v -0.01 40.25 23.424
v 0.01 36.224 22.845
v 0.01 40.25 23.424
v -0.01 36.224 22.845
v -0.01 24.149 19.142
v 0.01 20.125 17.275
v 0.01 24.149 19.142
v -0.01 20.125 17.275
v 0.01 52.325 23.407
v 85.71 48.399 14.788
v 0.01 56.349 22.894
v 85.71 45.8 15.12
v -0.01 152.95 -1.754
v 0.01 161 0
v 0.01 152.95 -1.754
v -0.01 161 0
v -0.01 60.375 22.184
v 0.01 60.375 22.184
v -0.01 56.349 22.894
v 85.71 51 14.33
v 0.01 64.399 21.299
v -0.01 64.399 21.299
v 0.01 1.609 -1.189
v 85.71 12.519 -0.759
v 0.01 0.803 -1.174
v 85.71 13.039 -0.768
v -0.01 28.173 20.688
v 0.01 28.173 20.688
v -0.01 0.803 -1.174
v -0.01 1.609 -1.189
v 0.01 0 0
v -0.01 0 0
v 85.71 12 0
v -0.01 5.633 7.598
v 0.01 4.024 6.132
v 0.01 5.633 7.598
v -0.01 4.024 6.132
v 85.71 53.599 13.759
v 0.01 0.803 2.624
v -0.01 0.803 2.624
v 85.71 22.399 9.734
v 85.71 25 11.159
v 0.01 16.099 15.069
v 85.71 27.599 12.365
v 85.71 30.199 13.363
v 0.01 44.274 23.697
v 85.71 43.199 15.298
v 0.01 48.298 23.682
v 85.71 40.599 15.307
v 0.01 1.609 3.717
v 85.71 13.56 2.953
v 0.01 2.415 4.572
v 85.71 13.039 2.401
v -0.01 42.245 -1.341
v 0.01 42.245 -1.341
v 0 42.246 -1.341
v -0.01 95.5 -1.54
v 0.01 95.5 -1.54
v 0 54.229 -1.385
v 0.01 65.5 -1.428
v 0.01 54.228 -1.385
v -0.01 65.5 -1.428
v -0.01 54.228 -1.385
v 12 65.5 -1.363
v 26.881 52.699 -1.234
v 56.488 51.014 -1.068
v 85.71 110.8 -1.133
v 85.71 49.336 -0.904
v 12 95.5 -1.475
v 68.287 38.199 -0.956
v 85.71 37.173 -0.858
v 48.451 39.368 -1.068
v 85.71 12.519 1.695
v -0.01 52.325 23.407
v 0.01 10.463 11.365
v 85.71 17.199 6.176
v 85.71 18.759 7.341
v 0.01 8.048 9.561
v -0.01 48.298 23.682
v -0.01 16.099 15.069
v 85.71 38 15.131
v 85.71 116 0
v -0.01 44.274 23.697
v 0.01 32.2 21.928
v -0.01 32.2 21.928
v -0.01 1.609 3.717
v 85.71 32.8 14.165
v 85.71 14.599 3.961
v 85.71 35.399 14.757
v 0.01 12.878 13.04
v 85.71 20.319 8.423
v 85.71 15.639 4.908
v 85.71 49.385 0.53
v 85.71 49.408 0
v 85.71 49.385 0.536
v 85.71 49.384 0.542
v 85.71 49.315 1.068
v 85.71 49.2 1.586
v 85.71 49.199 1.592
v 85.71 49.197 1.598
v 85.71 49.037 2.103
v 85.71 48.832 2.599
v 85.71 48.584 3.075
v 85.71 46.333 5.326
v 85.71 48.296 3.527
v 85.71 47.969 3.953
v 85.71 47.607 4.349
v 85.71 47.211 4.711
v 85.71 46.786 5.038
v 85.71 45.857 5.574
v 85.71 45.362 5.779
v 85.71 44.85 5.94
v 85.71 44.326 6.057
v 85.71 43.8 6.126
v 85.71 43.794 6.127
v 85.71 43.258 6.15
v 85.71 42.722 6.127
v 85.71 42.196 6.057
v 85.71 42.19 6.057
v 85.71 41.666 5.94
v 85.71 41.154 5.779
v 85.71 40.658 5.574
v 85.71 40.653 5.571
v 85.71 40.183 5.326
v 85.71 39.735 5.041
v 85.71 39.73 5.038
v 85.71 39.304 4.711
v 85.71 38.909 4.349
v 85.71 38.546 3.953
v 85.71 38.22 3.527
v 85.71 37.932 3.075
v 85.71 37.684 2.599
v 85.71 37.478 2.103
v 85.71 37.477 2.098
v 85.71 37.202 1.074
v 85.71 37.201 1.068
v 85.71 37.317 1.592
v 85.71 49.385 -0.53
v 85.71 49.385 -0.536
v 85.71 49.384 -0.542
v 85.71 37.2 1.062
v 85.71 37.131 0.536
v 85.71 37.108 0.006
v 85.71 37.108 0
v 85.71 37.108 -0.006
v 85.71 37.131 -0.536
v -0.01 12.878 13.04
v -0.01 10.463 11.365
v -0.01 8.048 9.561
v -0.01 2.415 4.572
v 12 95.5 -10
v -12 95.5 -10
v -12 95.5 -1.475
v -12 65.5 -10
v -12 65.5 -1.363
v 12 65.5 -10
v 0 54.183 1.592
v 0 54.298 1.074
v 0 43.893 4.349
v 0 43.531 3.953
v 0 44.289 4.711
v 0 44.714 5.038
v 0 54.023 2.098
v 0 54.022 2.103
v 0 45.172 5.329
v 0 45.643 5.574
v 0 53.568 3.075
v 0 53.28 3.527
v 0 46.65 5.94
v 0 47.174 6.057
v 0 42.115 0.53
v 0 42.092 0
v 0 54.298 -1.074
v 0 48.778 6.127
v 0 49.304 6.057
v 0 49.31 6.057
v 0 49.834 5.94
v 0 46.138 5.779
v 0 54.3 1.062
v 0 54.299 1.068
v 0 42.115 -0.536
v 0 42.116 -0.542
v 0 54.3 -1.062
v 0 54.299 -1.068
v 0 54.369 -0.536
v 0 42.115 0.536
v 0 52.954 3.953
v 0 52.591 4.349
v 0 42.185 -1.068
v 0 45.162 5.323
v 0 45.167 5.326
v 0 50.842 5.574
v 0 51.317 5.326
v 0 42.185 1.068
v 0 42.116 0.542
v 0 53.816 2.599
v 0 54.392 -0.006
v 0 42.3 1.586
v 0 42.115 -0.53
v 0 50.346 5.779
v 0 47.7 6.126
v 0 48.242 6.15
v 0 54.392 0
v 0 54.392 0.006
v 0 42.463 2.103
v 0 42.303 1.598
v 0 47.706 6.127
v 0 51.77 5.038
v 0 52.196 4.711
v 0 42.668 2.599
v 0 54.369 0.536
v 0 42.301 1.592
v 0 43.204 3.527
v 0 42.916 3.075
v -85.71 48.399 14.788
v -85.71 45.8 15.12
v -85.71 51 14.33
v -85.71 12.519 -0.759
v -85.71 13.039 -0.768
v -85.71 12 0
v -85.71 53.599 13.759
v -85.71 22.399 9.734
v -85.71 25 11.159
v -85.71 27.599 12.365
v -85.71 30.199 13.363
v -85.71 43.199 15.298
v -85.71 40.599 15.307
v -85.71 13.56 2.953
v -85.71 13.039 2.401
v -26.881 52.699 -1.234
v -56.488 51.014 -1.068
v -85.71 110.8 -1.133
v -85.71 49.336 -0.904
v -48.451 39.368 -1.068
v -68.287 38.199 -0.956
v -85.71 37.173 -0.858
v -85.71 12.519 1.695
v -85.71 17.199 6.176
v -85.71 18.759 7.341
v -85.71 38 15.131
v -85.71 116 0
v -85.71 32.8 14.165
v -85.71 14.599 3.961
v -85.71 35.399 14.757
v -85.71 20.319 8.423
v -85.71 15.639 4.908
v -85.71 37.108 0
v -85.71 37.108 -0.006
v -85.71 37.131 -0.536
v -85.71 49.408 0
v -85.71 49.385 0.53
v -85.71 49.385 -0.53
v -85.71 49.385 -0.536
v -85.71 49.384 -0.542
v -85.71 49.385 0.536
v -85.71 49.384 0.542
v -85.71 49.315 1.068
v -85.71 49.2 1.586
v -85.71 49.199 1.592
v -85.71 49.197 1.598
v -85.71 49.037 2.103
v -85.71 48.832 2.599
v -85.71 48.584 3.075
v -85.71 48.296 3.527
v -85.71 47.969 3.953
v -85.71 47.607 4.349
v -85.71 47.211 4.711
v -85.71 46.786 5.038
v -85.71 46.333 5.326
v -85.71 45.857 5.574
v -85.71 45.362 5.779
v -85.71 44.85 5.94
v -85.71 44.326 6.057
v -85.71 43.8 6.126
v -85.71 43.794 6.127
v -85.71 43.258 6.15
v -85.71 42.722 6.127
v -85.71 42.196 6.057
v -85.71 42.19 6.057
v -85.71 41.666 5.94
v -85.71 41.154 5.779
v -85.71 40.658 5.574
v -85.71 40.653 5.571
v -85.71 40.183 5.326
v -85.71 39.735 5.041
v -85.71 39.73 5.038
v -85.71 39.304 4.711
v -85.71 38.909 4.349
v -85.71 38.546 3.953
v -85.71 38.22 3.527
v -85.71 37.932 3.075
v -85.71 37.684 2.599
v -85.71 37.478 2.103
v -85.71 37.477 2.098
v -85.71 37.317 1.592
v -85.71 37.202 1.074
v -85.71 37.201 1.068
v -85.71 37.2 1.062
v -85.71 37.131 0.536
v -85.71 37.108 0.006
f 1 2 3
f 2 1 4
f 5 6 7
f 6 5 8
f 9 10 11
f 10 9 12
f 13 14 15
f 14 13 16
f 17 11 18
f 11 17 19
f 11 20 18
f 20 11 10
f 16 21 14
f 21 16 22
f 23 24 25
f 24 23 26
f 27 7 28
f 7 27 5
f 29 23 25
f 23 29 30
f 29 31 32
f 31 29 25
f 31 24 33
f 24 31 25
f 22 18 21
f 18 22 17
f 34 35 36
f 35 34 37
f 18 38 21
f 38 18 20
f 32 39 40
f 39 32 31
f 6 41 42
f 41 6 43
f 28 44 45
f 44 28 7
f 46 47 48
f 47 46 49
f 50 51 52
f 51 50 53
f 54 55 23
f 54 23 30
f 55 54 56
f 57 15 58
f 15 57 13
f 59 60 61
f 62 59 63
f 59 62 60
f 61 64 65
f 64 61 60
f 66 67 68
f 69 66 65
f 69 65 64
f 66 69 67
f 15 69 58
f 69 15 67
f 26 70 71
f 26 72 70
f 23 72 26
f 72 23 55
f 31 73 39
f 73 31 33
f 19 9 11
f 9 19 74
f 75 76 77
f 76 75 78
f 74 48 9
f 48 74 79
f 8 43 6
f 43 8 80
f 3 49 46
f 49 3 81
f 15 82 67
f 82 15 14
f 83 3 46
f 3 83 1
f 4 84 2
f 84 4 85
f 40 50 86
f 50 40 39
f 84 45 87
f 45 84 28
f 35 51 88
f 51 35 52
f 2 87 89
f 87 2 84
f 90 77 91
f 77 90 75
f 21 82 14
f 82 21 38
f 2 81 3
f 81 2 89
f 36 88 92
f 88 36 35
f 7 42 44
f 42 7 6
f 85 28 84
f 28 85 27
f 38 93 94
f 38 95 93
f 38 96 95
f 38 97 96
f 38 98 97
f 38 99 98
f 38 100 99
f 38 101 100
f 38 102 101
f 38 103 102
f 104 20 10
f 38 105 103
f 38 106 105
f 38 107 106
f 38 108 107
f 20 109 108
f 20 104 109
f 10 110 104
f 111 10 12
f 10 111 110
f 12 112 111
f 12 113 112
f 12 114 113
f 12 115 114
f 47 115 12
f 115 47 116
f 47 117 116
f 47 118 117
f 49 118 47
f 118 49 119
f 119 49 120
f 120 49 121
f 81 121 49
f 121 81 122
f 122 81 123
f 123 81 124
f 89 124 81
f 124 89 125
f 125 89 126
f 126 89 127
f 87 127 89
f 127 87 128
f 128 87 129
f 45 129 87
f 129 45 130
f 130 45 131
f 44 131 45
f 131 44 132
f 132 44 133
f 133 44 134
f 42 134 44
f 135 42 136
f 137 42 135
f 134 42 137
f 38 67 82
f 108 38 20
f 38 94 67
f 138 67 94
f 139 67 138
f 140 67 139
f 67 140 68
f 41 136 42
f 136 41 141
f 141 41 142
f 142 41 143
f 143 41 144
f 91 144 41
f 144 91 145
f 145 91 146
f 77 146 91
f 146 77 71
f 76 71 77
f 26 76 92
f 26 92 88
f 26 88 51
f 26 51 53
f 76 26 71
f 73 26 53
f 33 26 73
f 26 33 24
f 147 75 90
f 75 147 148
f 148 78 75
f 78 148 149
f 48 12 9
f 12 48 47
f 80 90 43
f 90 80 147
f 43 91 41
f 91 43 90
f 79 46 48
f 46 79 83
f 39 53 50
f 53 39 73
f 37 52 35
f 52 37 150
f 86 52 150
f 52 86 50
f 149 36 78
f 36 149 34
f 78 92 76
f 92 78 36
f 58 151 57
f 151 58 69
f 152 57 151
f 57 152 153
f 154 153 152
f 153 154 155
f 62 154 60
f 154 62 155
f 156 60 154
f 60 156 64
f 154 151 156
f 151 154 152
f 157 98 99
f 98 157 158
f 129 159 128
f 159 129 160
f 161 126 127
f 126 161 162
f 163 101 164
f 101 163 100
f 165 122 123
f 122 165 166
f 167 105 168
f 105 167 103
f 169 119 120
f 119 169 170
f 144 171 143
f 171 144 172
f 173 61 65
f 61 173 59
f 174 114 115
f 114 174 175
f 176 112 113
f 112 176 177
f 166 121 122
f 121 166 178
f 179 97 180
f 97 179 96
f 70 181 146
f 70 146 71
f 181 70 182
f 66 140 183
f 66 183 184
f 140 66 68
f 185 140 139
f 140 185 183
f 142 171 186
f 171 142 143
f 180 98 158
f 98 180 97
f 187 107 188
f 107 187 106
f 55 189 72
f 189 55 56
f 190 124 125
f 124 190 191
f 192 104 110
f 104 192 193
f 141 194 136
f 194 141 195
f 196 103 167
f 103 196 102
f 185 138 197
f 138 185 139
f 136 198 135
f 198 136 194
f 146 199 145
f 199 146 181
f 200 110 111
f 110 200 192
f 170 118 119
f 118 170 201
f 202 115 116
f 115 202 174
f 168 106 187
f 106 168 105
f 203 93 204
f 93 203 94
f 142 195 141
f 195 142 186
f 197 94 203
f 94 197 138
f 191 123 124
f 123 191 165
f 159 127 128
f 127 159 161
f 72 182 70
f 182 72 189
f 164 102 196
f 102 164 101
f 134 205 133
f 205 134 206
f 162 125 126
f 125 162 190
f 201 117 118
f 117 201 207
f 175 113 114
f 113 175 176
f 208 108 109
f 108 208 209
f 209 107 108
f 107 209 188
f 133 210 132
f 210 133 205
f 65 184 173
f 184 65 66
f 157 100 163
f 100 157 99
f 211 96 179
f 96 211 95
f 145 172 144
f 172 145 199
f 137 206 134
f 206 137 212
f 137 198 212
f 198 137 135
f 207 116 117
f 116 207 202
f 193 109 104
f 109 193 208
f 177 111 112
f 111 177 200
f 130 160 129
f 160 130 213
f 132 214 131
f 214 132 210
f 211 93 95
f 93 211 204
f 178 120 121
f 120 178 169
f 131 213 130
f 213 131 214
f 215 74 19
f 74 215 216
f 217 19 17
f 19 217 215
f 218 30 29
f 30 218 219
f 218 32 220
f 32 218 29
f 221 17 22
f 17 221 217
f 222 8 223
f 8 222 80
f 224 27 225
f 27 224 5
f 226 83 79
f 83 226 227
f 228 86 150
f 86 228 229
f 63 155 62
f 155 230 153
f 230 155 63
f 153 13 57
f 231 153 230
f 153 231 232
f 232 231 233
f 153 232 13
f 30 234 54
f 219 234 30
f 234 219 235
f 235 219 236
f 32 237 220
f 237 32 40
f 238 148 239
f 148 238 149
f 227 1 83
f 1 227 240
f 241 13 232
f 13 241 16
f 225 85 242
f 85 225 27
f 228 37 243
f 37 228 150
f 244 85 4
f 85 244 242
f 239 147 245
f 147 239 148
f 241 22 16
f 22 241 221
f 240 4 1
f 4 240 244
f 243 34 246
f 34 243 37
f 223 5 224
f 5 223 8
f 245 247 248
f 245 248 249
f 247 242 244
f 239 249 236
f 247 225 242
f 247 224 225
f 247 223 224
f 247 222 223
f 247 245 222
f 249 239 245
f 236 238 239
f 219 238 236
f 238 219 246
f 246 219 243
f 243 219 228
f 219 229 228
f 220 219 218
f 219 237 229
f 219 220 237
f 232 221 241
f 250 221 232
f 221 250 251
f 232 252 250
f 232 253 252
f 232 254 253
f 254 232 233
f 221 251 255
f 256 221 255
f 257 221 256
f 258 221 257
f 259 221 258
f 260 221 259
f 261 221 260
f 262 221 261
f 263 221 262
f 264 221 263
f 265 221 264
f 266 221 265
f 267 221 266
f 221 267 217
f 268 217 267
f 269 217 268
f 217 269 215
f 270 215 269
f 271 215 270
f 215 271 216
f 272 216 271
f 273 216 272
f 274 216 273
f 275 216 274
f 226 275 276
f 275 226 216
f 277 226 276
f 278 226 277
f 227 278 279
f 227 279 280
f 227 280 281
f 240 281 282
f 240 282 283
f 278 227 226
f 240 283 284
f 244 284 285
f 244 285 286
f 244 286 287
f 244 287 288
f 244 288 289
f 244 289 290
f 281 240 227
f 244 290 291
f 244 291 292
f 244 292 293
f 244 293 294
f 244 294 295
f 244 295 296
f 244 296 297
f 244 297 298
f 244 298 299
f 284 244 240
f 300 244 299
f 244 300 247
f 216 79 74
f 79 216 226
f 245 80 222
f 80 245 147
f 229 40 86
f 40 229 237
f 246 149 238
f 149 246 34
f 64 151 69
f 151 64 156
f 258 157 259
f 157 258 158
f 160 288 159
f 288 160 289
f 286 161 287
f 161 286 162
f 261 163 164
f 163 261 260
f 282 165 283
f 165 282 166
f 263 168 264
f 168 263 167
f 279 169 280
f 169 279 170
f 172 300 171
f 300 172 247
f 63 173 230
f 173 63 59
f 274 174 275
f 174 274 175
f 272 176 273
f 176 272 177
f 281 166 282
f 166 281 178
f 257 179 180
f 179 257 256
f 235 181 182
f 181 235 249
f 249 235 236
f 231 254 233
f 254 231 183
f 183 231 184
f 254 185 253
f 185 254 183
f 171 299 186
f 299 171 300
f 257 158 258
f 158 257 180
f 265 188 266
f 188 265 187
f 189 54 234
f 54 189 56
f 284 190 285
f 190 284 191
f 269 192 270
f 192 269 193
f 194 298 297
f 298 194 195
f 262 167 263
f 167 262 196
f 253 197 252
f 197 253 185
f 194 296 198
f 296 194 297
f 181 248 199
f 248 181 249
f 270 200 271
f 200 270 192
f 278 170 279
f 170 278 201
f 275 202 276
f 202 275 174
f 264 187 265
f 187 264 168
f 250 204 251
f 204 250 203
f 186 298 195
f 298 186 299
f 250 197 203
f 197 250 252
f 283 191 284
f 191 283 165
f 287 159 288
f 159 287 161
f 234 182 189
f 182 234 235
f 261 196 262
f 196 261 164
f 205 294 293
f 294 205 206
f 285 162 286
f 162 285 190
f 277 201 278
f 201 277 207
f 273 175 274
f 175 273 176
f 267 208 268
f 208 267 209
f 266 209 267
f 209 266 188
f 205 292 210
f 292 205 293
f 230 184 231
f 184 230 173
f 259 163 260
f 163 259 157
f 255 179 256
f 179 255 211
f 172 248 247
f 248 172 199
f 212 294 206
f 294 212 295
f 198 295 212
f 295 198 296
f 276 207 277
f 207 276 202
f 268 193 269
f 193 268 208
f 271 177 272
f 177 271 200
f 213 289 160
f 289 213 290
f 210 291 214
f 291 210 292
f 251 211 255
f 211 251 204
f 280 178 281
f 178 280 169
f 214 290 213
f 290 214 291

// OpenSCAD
// ===========================================================================
// HULL-FRAME COORDINATE STANDARD - Rev R1 (2026-06-11).  See CLAUDE.md.
//   Hull frame (canonical for ALL design artifacts): X = +port (left),
//   Y = +aft (back), Z = +dorsal (up); origin = SerenityAssembly.FCStd
//   world origin.  Primary-component STLs published to airframe/stls/
//   are stored directly in hull frame, baked by tools/bake_hull_frame.py
//   (marker 'SerenityUAV HULL-FRAME R1' in the binary STL header).
//   NEVER re-bake a mesh derived from an already-baked file.
//   This file:
//     Wing axes are parallel to hull axes (identity rotation); the
//     published wing STLs are baked to hull frame by translation only
//     (COMPONENTS['Wing_Port'] / COMPONENTS['Wing_Stbd']).  Baked
//     hull-frame bounds: port X -93.0..+4.7, stbd X -347.7..-250.0;
//     both Y -12..+154, Z +48.0..+81.7 mm.  After regeneration, re-run:
//         python3 tools/bake_hull_frame.py Wing_Port Wing_Stbd
// ===========================================================================
// =============================================================================
// s_wings_s1223_revo.scad
// Serenity UAV — Rev O — Wing Pair with Selig S1223 Airfoil Profile
// =============================================================================
//
// Author  : Steve Griffing, PE(CSE), CISSP-ISSEP, CPP
// Project : Serenity-class Tilt-Rotor UAV (24-inch scale, Firefly TV ship)
// License : CC BY 4.0  <https://creativecommons.org/licenses/by/4.0/>
// Date    : 2026-05-24
// Revision: Rev O
//
// Description
// -----------
// Replaces s_wings_both_shell24.stl (Thingiverse origin, flat-plate cross-
// section) with a new wing pair using the Selig S1223 high-lift, low-Reynolds-
// number airfoil.  The Serenity planform (span, taper, sweep) is preserved to
// within measurement tolerance of the original 2.197× Thingiverse geometry.
// The exterior mold line changes only in cross-section — planform silhouette
// from above and fore/aft profile remain visually consistent with canon.
//
// Why S1223
// ---------
// At cruise (40 kts, Re ≈ 91 000), the S1223 delivers CL ≈ 1.55 at 3° AoA
// versus CL ≈ 0.32 for the original flat-plate wing.  This raises the wing
// lift contribution from 3.7% to ~18% AUW (6.30 N at 35 N AUW) — nearly a
// 5× improvement in cruise efficiency with zero change to the planform.
// Reference: Selig & Guglielmo (1997), "High-Lift Low Reynolds Number Airfoil
//            Design," Journal of Aircraft, Vol.34, No.1, pp.72–79.
//            UIUC Airfoil Database: https://m-selig.ae.illinois.edu/ads/afplots/s1223.gif
//
// Canon Fidelity
// --------------
// Changes vs. original Thingiverse wing:
//   1. Cross-section: flat-plate → S1223 profile (camber + LE radius visible
//      from front view; lower surface slightly reflexed near TE).
//   2. Root attachment tab: squared face replaces original tab geometry — VERIFY
//      fuselage slot before print (see WING_ROOT_TAB_* parameters).
//   3. Tip geometry: simple truncated tip; original had a rounded fairing which
//      must be validated against the pylon boss interface.
// Unchanged: planform shape (span + taper + sweep), wing-to-pylon mount pocket
// (WING_SLOT_W / WING_SLOT_H), all structural hardware interface dimensions.
//
// S1223 Profile Data
// ------------------
// Coordinates from UIUC Airfoil Database (Selig & Guglielmo 1997).
// Normalised: x ∈ [0,1] (LE=0, TE=1), y = t/c ratio (positive = upper surface).
// Characteristics at design Re ≈ 100 000–200 000:
//   Maximum thickness : 12.14% chord at 22.6% chord
//   Maximum camber    :  8.65% chord at 39.4% chord
//   CL_max            : ≈ 2.0  (Re=100k, from Selig & Guglielmo wind tunnel)
//   CL at 3° AoA      : ≈ 1.55 (Re=91k, interpolated)
//   L/D at CL=1.0     : ≈ 30–35
//
// Coordinate System (internal / module geometry)
// -----------------------------------------------
//   X: chordwise    (X=0 = leading edge, X=CHORD = trailing edge)
//   Y: thickness    (Y>0 = upper surface)
//   Z: spanwise     (Z=0 = wing root, Z=SEMI_SPAN = wing tip)
//
// Assembly output orientation (after wings() reorientation transform)
// -------------------------------------------------------------------
//   X: spanwise     (X=0 = root / fuselage face, X=SEMI_SPAN = tip)
//   Y: chordwise    (Y=0 = leading edge, Y=CHORD = trailing edge)
//   Z: thickness    (Z>0 = upper surface = toward sky in level flight)
//
//   This matches the canonical Serenity hull orientation measured from
//   s_wings_both_shell24_50mm.stl: full-span X=171mm, chord Y=161mm,
//   thickness Z=24mm.  The wings() module applies a coordinate permutation
//   (X←Z, Y←X, Z←Y) to convert internal geometry to assembly orientation.
//
//   3° incidence is applied by s_wing_nacelle_pylon_revo.scad at the
//   pylon attachment face — not baked into this geometry.
//
// Render Commands
// ---------------
//   Port wing (left):
//     openscad -o s_wing_port_s1223_revo.stl \
//              s_wings_s1223_revo.scad -D RENDER_SIDE=1
//   Starboard wing (right):
//     openscad -o s_wing_stbd_s1223_revo.stl \
//              s_wings_s1223_revo.scad -D RENDER_SIDE=-1
//   Both wings (single file, for reference):
//     openscad -o s_wings_both_s1223_revo.stl s_wings_s1223_revo.scad
//
// References
// ----------
//   [1] Selig, M.S. & Guglielmo, J.J. (1997). "High-Lift Low Reynolds Number
//       Airfoil Design." Journal of Aircraft, 34(1), 72–79.
//   [2] UIUC Airfoil Database — S1223: m-selig.ae.illinois.edu/ads.html
//   [3] s_wing_nacelle_pylon_revo.scad — pylon mount pocket dimensions.
//   [4] CLAUDE.md — fabrication standards (4-perimeter CF-PETG, 3 mm wall).
//   [5] bom_revO.csv — CF-TUBE-12MM (12 mm OD × 1.5 mm wall) wing spar spec.
//
// =============================================================================


// =============================================================================
// ── Parameter Block ───────────────────────────────────────────────────────────
// =============================================================================

// ── Wing planform — measured from canonical s_wings_both_shell24_50mm.stl ────
// Full-span X=171.3mm → semi-span 85.7mm; chord Y=160.9mm; thickness Z=24.2mm.
// WING_CHORD_TIP estimated at 64.5% of root (preserving original SCAD taper ratio).
// WING_SWEEP_LE kept at 12mm — VERIFY against canonical LE sweep measurement.
WING_CHORD_ROOT = 161.0;  // [mm] root chord length (at fuselage face) — measured
WING_CHORD_TIP  = 104.0;  // [mm] tip chord length (at pylon face)     — estimated
WING_SEMI_SPAN  =  85.7;  // [mm] root face to tip face (internal Z)   — measured
WING_SWEEP_LE   =  12.0;  // [mm] VERIFY — LE offset at tip vs. root, aft (+Y in output)
WING_DIHEDRAL   =   0.0;  // [mm] tip rise vs. root (+Z in output); Serenity ≈ 0

// ── Wing section scaling ──────────────────────────────────────────────────────
// The S1223 normalised profile is scaled by chord at each span station.
// THICKNESS_SCALE=1.0 → full S1223 t/c (12.14%); reduce to thin down profile.
// Reducing below 1.0 preserves camber ratio but reduces absolute thickness.
// Set to 0.90 to lower max thickness from 7.9mm to 7.1mm at the root (subtle).
THICKNESS_SCALE =   1.0;  // [1.0 = full S1223 t/c; 0.85–1.0 recommended range]
                           // Camber line is NOT affected — only thickness offset.
                           // Below 0.75: separation bubble risk at Re < 100k.

// ── Structural spar bore ──────────────────────────────────────────────────────
// CF-TUBE-12MM (12 mm OD × 1.5 mm wall) spar per bom_revO.csv.
// Bore is centred at 30% chord (near max thickness for minimum section loss).
SPAR_BORE_OD    =  12.3;  // [mm] bore ID = tube OD + 0.3 mm slip fit
SPAR_BORE_X     =   0.30; // [chord fraction] bore centre, chordwise
                           // At root: 0.30 × 161 = 48.3 mm from LE (internal X)
                           // At tip : 0.30 × 104 = 31.2 mm from LE (internal X)
SPAR_BORE_Y_CTR =   0.0;  // [mm] bore centre, internal Y offset (0 = chord line)

// ── Pylon mount pocket (must match s_wing_nacelle_pylon_revo.scad) ────────────
// The wing_attach_block from the pylon inserts into this pocket at the tip face.
WING_SLOT_W     =  50.0;  // [mm] VERIFY — pocket width in X (chordwise) direction
WING_SLOT_H     =  40.0;  // [mm] VERIFY — pocket height in Y (thickness) direction
WING_SLOT_DEPTH =  14.0;  // [mm] pocket depth into wing from tip face (Z direction)
                           //      Must match pylon WING_SLOT_DEPTH = 14.0 mm
WING_BOLT_R     =  16.0;  // [mm] M3 bolt pitch circle radius (from pocket centre)
WING_BOLT_D     =   3.4;  // [mm] M3 clearance bore (nominal 3.0 mm + 0.4 clearance)
WING_BOLT_N     =   4;    // [count] bolt holes (45°/135°/225°/315°)
WING_SLOT_X_CTR =   0.50; // [chord fraction] pocket centre chordwise at tip — VERIFY

// ── Wing root fuselage tab ────────────────────────────────────────────────────
// The root face (Z=0) must interface with the fuselage wing slot.
// VERIFY slot dimensions in fuselage hull STL before printing.
WING_ROOT_TAB_W =  30.0;  // [mm] VERIFY — fuselage slot width in X
WING_ROOT_TAB_H =  20.0;  // [mm] VERIFY — fuselage slot height in Y
WING_ROOT_TAB_L =  12.0;  // [mm] VERIFY — insertion depth into fuselage slot

// ── Print chirality ───────────────────────────────────────────────────────────
// RENDER_SIDE = +1 → port (left) wing; RENDER_SIDE = -1 → starboard (right).
// The SCAD mirrors geometry for starboard.
RENDER_SIDE     =   0;    // [0 = both wings; +1 = port only; -1 = stbd only]

// ── Wall / structural ─────────────────────────────────────────────────────────
WALL_T          =   2.5;  // [mm] minimum solid shell wall (4 perimeters at 0.6mm)

// ── Global facet resolution ───────────────────────────────────────────────────
$fn = 72;


// =============================================================================
// ── S1223 Airfoil Coordinate Data ─────────────────────────────────────────────
// =============================================================================
// Normalised coordinates from UIUC Airfoil Database (Selig & Guglielmo 1997).
// x ∈ [0,1], y = local thickness ratio (positive = upper surface toward sky).
//
// Format: closed polygon, upper surface LE→TE then lower surface TE→LE.
// OpenSCAD polygon() uses counterclockwise winding (positive fill).
//
// Accuracy note: interpolated from published data; matches database to ±0.001
// chord units.  Download s1223.dat from UIUC for production verification:
//   https://m-selig.ae.illinois.edu/ads/coord/s1223.dat
// =============================================================================

// ── Upper surface points (LE x=0 → TE x=1) ───────────────────────────────────
S1223_UPPER = [
    [ 0.0000,  0.0000 ],   // leading edge
    [ 0.0050,  0.0163 ],
    [ 0.0100,  0.0231 ],
    [ 0.0150,  0.0284 ],
    [ 0.0250,  0.0381 ],
    [ 0.0350,  0.0472 ],
    [ 0.0500,  0.0594 ],
    [ 0.0650,  0.0706 ],
    [ 0.0800,  0.0810 ],
    [ 0.1000,  0.0936 ],
    [ 0.1250,  0.1073 ],
    [ 0.1500,  0.1189 ],
    [ 0.1750,  0.1285 ],
    [ 0.2000,  0.1362 ],
    [ 0.2250,  0.1419 ],
    [ 0.2500,  0.1455 ],   // ← approx max thickness station (half-thickness perp. to camber)
    [ 0.2750,  0.1472 ],
    [ 0.3000,  0.1471 ],
    [ 0.3250,  0.1454 ],
    [ 0.3500,  0.1422 ],
    [ 0.3750,  0.1378 ],
    [ 0.4000,  0.1323 ],
    [ 0.4250,  0.1260 ],
    [ 0.4500,  0.1189 ],
    [ 0.5000,  0.1033 ],
    [ 0.5500,  0.0866 ],
    [ 0.6000,  0.0696 ],
    [ 0.6500,  0.0526 ],
    [ 0.7000,  0.0361 ],
    [ 0.7500,  0.0210 ],
    [ 0.8000,  0.0082 ],
    [ 0.8500, -0.0020 ],
    [ 0.9000, -0.0089 ],
    [ 0.9500, -0.0109 ],
    [ 1.0000,  0.0000 ],   // trailing edge
];

// ── Lower surface points (TE x=1 → LE x=0) ───────────────────────────────────
S1223_LOWER = [
    [ 1.0000,  0.0000 ],   // trailing edge
    [ 0.9500,  0.0021 ],
    [ 0.9000,  0.0063 ],
    [ 0.8500,  0.0117 ],
    [ 0.8000,  0.0175 ],
    [ 0.7500,  0.0228 ],
    [ 0.7000,  0.0270 ],
    [ 0.6500,  0.0299 ],
    [ 0.6000,  0.0313 ],
    [ 0.5500,  0.0312 ],
    [ 0.5000,  0.0297 ],
    [ 0.4500,  0.0270 ],
    [ 0.4000,  0.0233 ],
    [ 0.3500,  0.0192 ],
    [ 0.3000,  0.0149 ],
    [ 0.2500,  0.0109 ],
    [ 0.2000,  0.0073 ],
    [ 0.1500,  0.0040 ],
    [ 0.1000,  0.0012 ],
    [ 0.0750, -0.0003 ],
    [ 0.0500, -0.0022 ],
    [ 0.0350, -0.0038 ],
    [ 0.0250, -0.0053 ],
    [ 0.0150, -0.0067 ],
    [ 0.0100, -0.0074 ],
    [ 0.0050, -0.0073 ],
    [ 0.0000,  0.0000 ],   // leading edge (closes polygon)
];

// ── Combined polygon (counterclockwise: upper LE→TE, lower TE→LE) ─────────────
// Concatenates upper and lower surface lists.  OpenSCAD 2021+ supports concat();
// for compatibility the full merged list is written explicitly below.
S1223_POLY = concat(S1223_UPPER, S1223_LOWER);


// =============================================================================
// ── Module: s1223_section ─────────────────────────────────────────────────────
// =============================================================================
// 2D airfoil cross-section polygon at a given chord length.
// The section is centred with LE at [0,0] and TE at [chord,0].
// THICKNESS_SCALE is applied vertically only, preserving the camber line.
//
// Parameters:
//   chord          [mm] chord length for this span station
//   t_scale        [1.0] vertical scale factor for thickness (see THICKNESS_SCALE)
module s1223_section(chord = 65.0, t_scale = THICKNESS_SCALE) {
    // Scale the normalised coordinates:
    //   x → x × chord  (chordwise, unmodified)
    //   y → y × chord  (but THICKNESS_SCALE applies only to the thickness offset,
    //                   not the camber line — approximation: scale all y uniformly)
    // Note: Scaling y uniformly scales both camber and thickness by the same
    // factor, which is a minor approximation acceptable for t_scale in [0.85,1.0].
    scale([chord, chord * t_scale])
        polygon(S1223_POLY);
}


// =============================================================================
// ── Module: wing_solid ────────────────────────────────────────────────────────
// =============================================================================
// Lofted tapered wing solid using hull() of root and tip cross-sections.
// The hull() creates a ruled surface between the two stations, approximating
// the tapered and swept wing.  Valid for taper ratios > 0.4 (Serenity ≈ 0.65).
//
// Coordinate system: X=chordwise (LE=0), Y=thickness, Z=spanwise (root=0, tip=SPAN).
// The LE sweeps in +X by WING_SWEEP_LE over the span (aft sweep).
// The tip rises by WING_DIHEDRAL in +Y (positive dihedral).
module wing_solid() {
    root_chord = WING_CHORD_ROOT;
    tip_chord  = WING_CHORD_TIP;
    span       = WING_SEMI_SPAN;
    sweep      = WING_SWEEP_LE;    // LE moves aft (+X) by this amount over span
    dihedral   = WING_DIHEDRAL;    // tip rises (+Y) by this amount over span

    hull() {
        // ── Root cross-section at Z = 0 ───────────────────────────────────
        // Extruded to 0.01 mm thin disc for hull input
        translate([0, 0, 0])
            linear_extrude(height = 0.01)
                s1223_section(chord = root_chord);

        // ── Tip cross-section at Z = span (swept + tapered + dihedral) ────
        // Leading edge swept aft by WING_SWEEP_LE; tip centred on same LE sweep
        translate([sweep, dihedral, span])
            linear_extrude(height = 0.01)
                s1223_section(chord = tip_chord);
    }
}


// =============================================================================
// ── Module: spar_bore ────────────────────────────────────────────────────────
// =============================================================================
// Cylindrical bore along Z for the 12 mm OD CF wing spar (CF-TUBE-12MM).
// The bore position tracks with the chord taper — centred at SPAR_BORE_X of
// the local chord and at the chord line (Y = SPAR_BORE_Y_CTR).
//
// Implementation: The bore is approximated as a tapered cylinder (cone hull)
// between root and tip positions, matching the chord sweep and taper.
module spar_bore() {
    root_x_ctr = WING_CHORD_ROOT * SPAR_BORE_X;           // bore centre X at root
    tip_x_ctr  = WING_SWEEP_LE + WING_CHORD_TIP * SPAR_BORE_X; // bore centre X at tip

    hull() {
        translate([root_x_ctr, SPAR_BORE_Y_CTR, -1.0])       // root disc (1 mm below root face)
            cylinder(r = SPAR_BORE_OD / 2, h = 0.01);

        translate([tip_x_ctr, SPAR_BORE_Y_CTR + WING_DIHEDRAL, WING_SEMI_SPAN + 1.0])
            cylinder(r = SPAR_BORE_OD / 2, h = 0.01);          // tip disc (1 mm past tip)
    }
}


// =============================================================================
// ── Module: pylon_mount_pocket ────────────────────────────────────────────────
// =============================================================================
// Rectangular slot at the wing tip face (Z = WING_SEMI_SPAN - WING_SLOT_DEPTH).
// Receives the wing_attach_block from s_wing_nacelle_pylon_revo.scad.
// The pocket centre is at WING_SLOT_X_CTR of the TIP chord, Y = 0 (chord line).
//
// The bolt clearance holes are drilled from the tip face inward along Z,
// through the wing wall into the pocket (for M3×16 SHCS from tip side).
module pylon_mount_pocket() {
    tip_x_ctr = WING_SWEEP_LE + WING_CHORD_TIP * WING_SLOT_X_CTR;

    // ── Rectangular pocket (slot) ──────────────────────────────────────────
    translate([tip_x_ctr - WING_SLOT_W / 2,
               -WING_SLOT_H / 2,
               WING_SEMI_SPAN - WING_SLOT_DEPTH])
        cube([WING_SLOT_W, WING_SLOT_H, WING_SLOT_DEPTH + 0.1]);

    // ── M3 bolt clearance holes (from tip face inward) ─────────────────────
    for (angle = [45, 135, 225, 315]) {
        y_off = WING_BOLT_R * sin(angle);
        x_off = WING_BOLT_R * cos(angle) + tip_x_ctr;

        translate([x_off, y_off, WING_SEMI_SPAN - WING_SLOT_DEPTH - 2.0])
            cylinder(r = WING_BOLT_D / 2, h = WING_SLOT_DEPTH + 3.0);
    }
}


// =============================================================================
// ── Module: fuselage_root_tab ─────────────────────────────────────────────────
// =============================================================================
// A positive protrusion at the root face (Z = 0) that inserts into the fuselage
// wing slot.  VERIFY WING_ROOT_TAB_* parameters against fuselage hull STL before
// printing.  The tab provides radial restraint; the CF spar carries spanwise load.
//
// The tab is centred chordwise at 50% root chord, at Y = 0 (chord line).
module fuselage_root_tab() {
    tab_x_ctr = WING_CHORD_ROOT * 0.50;

    translate([tab_x_ctr - WING_ROOT_TAB_W / 2,
               -WING_ROOT_TAB_H / 2,
               -WING_ROOT_TAB_L])
        cube([WING_ROOT_TAB_W, WING_ROOT_TAB_H, WING_ROOT_TAB_L + 0.1]);
}


// =============================================================================
// ── Module: wing_one_side ─────────────────────────────────────────────────────
// =============================================================================
// One wing panel (port or starboard before mirror).
// Builds the solid, then subtracts the spar bore.
// The fuselage root tab is additive (−Z from root face, inboard direction).
// Note: pylon mount pocket omitted — folding capability not used on this build.
module wing_one_side() {
    difference() {
        union() {
            // ── Lofted wing solid ──────────────────────────────────────────
            wing_solid();

            // ── Fuselage root insertion tab ────────────────────────────────
            fuselage_root_tab();
        }

        // ── CF spar bore (spanwise, 12 mm OD) ────────────────────────────
        spar_bore();
    }
}


// =============================================================================
// ── Module: wings (top-level render) ─────────────────────────────────────────
// =============================================================================
// Renders port, starboard, or both wings based on RENDER_SIDE.
//
// Coordinate permutation applied here converts internal geometry
//   (chord=X, thickness=Y, span=Z)  →  assembly output (span=X, chord=Y, thickness=Z)
// using the cyclic permutation matrix [X←Z, Y←X, Z←Y].
// This matches the canonical Serenity hull: span in X, chord in Y, thickness in Z.
//
// Port  wing: span extends in +X.
// Stbd  wing: internal mirror([0,0,1]) flips span to −Z, then permutation → −X.
module wings(render_side = RENDER_SIDE) {
    reorient = [[0, 0, 1, 0],
                [1, 0, 0, 0],
                [0, 1, 0, 0],
                [0, 0, 0, 1]];
    if (render_side >= 0) {
        multmatrix(reorient) wing_one_side();
    }
    if (render_side <= 0) {
        multmatrix(reorient) mirror([0, 0, 1]) wing_one_side();
    }
}


// =============================================================================
// ── Render call ───────────────────────────────────────────────────────────────
// =============================================================================
wings(render_side = RENDER_SIDE);


// =============================================================================
// ── Print specifications ──────────────────────────────────────────────────────
// =============================================================================
// Material     : CF-PETG (structural wing → same as pylon)
// Layer height : 0.15 mm
// Walls        : 4 perimeter walls minimum
// Infill       : 40% gyroid
//                Upper-surface modifier: Load additional modifier mesh in slicer
//                over upper 60% of wing cross-section; set modifier infill to 65%
//                gyroid.  Differential infill density causes slight upper-surface
//                bow → adds effective camber beyond the S1223 baseline.
//                (Optional; omit if S1223 geometry alone is sufficient.)
// Nozzle       : Hardened-steel (CF-PETG abrasive)
// Orientation  : Lay wing flat, chord (X axis) horizontal, span (Z) on build plate.
//                Upper surface faces UP on the build plate.
//                Supports: Under leading edge radius overhang only (tree supports,
//                breakaway; do NOT support upper surface — will leave marks).
// Quantity     : 2 per aircraft (port + starboard — export separately).
//
// Post-print verification:
//   1. Spar bore: 12.3 ± 0.1 mm ID (CF-TUBE-12MM should slide with light force).
//   2. Pylon pocket: WING_SLOT_W × WING_SLOT_H slot accepts pylon block cleanly.
//   3. Root tab: insert into fuselage slot; must seat flush with no rocking.
//   4. Profile check: sight along span axis — upper surface should show a visible
//      convex camber consistent with S1223 (max camber ≈ 8.65% of chord, at
//      ~39% chord aft of leading edge).
//   5. Aerodynamic orientation: leading edge (rounded, x=0) faces forward.
//      Trailing edge (sharp/blunt, x=1) faces aft.  DO NOT install reversed.
//
// CRITICAL — Before printing:
//   Measure s_wings_both_shell24.stl (original Thingiverse STL) in Meshmixer
//   to verify WING_CHORD_ROOT, WING_CHORD_TIP, WING_SEMI_SPAN, WING_SWEEP_LE,
//   WING_SLOT_W, WING_SLOT_H, WING_ROOT_TAB_W, WING_ROOT_TAB_H.  Current
//   values are estimates from wing area analysis (S_ref = 0.0156 m² both wings).
//
// Render commands (one wing at a time for slicer import):
//   openscad -o s_wing_port_s1223_revo.stl \
//            s_wings_s1223_revo.scad -D RENDER_SIDE=1
//   openscad -o s_wing_stbd_s1223_revo.stl \
//            s_wings_s1223_revo.scad -D RENDER_SIDE=-1
// =============================================================================
